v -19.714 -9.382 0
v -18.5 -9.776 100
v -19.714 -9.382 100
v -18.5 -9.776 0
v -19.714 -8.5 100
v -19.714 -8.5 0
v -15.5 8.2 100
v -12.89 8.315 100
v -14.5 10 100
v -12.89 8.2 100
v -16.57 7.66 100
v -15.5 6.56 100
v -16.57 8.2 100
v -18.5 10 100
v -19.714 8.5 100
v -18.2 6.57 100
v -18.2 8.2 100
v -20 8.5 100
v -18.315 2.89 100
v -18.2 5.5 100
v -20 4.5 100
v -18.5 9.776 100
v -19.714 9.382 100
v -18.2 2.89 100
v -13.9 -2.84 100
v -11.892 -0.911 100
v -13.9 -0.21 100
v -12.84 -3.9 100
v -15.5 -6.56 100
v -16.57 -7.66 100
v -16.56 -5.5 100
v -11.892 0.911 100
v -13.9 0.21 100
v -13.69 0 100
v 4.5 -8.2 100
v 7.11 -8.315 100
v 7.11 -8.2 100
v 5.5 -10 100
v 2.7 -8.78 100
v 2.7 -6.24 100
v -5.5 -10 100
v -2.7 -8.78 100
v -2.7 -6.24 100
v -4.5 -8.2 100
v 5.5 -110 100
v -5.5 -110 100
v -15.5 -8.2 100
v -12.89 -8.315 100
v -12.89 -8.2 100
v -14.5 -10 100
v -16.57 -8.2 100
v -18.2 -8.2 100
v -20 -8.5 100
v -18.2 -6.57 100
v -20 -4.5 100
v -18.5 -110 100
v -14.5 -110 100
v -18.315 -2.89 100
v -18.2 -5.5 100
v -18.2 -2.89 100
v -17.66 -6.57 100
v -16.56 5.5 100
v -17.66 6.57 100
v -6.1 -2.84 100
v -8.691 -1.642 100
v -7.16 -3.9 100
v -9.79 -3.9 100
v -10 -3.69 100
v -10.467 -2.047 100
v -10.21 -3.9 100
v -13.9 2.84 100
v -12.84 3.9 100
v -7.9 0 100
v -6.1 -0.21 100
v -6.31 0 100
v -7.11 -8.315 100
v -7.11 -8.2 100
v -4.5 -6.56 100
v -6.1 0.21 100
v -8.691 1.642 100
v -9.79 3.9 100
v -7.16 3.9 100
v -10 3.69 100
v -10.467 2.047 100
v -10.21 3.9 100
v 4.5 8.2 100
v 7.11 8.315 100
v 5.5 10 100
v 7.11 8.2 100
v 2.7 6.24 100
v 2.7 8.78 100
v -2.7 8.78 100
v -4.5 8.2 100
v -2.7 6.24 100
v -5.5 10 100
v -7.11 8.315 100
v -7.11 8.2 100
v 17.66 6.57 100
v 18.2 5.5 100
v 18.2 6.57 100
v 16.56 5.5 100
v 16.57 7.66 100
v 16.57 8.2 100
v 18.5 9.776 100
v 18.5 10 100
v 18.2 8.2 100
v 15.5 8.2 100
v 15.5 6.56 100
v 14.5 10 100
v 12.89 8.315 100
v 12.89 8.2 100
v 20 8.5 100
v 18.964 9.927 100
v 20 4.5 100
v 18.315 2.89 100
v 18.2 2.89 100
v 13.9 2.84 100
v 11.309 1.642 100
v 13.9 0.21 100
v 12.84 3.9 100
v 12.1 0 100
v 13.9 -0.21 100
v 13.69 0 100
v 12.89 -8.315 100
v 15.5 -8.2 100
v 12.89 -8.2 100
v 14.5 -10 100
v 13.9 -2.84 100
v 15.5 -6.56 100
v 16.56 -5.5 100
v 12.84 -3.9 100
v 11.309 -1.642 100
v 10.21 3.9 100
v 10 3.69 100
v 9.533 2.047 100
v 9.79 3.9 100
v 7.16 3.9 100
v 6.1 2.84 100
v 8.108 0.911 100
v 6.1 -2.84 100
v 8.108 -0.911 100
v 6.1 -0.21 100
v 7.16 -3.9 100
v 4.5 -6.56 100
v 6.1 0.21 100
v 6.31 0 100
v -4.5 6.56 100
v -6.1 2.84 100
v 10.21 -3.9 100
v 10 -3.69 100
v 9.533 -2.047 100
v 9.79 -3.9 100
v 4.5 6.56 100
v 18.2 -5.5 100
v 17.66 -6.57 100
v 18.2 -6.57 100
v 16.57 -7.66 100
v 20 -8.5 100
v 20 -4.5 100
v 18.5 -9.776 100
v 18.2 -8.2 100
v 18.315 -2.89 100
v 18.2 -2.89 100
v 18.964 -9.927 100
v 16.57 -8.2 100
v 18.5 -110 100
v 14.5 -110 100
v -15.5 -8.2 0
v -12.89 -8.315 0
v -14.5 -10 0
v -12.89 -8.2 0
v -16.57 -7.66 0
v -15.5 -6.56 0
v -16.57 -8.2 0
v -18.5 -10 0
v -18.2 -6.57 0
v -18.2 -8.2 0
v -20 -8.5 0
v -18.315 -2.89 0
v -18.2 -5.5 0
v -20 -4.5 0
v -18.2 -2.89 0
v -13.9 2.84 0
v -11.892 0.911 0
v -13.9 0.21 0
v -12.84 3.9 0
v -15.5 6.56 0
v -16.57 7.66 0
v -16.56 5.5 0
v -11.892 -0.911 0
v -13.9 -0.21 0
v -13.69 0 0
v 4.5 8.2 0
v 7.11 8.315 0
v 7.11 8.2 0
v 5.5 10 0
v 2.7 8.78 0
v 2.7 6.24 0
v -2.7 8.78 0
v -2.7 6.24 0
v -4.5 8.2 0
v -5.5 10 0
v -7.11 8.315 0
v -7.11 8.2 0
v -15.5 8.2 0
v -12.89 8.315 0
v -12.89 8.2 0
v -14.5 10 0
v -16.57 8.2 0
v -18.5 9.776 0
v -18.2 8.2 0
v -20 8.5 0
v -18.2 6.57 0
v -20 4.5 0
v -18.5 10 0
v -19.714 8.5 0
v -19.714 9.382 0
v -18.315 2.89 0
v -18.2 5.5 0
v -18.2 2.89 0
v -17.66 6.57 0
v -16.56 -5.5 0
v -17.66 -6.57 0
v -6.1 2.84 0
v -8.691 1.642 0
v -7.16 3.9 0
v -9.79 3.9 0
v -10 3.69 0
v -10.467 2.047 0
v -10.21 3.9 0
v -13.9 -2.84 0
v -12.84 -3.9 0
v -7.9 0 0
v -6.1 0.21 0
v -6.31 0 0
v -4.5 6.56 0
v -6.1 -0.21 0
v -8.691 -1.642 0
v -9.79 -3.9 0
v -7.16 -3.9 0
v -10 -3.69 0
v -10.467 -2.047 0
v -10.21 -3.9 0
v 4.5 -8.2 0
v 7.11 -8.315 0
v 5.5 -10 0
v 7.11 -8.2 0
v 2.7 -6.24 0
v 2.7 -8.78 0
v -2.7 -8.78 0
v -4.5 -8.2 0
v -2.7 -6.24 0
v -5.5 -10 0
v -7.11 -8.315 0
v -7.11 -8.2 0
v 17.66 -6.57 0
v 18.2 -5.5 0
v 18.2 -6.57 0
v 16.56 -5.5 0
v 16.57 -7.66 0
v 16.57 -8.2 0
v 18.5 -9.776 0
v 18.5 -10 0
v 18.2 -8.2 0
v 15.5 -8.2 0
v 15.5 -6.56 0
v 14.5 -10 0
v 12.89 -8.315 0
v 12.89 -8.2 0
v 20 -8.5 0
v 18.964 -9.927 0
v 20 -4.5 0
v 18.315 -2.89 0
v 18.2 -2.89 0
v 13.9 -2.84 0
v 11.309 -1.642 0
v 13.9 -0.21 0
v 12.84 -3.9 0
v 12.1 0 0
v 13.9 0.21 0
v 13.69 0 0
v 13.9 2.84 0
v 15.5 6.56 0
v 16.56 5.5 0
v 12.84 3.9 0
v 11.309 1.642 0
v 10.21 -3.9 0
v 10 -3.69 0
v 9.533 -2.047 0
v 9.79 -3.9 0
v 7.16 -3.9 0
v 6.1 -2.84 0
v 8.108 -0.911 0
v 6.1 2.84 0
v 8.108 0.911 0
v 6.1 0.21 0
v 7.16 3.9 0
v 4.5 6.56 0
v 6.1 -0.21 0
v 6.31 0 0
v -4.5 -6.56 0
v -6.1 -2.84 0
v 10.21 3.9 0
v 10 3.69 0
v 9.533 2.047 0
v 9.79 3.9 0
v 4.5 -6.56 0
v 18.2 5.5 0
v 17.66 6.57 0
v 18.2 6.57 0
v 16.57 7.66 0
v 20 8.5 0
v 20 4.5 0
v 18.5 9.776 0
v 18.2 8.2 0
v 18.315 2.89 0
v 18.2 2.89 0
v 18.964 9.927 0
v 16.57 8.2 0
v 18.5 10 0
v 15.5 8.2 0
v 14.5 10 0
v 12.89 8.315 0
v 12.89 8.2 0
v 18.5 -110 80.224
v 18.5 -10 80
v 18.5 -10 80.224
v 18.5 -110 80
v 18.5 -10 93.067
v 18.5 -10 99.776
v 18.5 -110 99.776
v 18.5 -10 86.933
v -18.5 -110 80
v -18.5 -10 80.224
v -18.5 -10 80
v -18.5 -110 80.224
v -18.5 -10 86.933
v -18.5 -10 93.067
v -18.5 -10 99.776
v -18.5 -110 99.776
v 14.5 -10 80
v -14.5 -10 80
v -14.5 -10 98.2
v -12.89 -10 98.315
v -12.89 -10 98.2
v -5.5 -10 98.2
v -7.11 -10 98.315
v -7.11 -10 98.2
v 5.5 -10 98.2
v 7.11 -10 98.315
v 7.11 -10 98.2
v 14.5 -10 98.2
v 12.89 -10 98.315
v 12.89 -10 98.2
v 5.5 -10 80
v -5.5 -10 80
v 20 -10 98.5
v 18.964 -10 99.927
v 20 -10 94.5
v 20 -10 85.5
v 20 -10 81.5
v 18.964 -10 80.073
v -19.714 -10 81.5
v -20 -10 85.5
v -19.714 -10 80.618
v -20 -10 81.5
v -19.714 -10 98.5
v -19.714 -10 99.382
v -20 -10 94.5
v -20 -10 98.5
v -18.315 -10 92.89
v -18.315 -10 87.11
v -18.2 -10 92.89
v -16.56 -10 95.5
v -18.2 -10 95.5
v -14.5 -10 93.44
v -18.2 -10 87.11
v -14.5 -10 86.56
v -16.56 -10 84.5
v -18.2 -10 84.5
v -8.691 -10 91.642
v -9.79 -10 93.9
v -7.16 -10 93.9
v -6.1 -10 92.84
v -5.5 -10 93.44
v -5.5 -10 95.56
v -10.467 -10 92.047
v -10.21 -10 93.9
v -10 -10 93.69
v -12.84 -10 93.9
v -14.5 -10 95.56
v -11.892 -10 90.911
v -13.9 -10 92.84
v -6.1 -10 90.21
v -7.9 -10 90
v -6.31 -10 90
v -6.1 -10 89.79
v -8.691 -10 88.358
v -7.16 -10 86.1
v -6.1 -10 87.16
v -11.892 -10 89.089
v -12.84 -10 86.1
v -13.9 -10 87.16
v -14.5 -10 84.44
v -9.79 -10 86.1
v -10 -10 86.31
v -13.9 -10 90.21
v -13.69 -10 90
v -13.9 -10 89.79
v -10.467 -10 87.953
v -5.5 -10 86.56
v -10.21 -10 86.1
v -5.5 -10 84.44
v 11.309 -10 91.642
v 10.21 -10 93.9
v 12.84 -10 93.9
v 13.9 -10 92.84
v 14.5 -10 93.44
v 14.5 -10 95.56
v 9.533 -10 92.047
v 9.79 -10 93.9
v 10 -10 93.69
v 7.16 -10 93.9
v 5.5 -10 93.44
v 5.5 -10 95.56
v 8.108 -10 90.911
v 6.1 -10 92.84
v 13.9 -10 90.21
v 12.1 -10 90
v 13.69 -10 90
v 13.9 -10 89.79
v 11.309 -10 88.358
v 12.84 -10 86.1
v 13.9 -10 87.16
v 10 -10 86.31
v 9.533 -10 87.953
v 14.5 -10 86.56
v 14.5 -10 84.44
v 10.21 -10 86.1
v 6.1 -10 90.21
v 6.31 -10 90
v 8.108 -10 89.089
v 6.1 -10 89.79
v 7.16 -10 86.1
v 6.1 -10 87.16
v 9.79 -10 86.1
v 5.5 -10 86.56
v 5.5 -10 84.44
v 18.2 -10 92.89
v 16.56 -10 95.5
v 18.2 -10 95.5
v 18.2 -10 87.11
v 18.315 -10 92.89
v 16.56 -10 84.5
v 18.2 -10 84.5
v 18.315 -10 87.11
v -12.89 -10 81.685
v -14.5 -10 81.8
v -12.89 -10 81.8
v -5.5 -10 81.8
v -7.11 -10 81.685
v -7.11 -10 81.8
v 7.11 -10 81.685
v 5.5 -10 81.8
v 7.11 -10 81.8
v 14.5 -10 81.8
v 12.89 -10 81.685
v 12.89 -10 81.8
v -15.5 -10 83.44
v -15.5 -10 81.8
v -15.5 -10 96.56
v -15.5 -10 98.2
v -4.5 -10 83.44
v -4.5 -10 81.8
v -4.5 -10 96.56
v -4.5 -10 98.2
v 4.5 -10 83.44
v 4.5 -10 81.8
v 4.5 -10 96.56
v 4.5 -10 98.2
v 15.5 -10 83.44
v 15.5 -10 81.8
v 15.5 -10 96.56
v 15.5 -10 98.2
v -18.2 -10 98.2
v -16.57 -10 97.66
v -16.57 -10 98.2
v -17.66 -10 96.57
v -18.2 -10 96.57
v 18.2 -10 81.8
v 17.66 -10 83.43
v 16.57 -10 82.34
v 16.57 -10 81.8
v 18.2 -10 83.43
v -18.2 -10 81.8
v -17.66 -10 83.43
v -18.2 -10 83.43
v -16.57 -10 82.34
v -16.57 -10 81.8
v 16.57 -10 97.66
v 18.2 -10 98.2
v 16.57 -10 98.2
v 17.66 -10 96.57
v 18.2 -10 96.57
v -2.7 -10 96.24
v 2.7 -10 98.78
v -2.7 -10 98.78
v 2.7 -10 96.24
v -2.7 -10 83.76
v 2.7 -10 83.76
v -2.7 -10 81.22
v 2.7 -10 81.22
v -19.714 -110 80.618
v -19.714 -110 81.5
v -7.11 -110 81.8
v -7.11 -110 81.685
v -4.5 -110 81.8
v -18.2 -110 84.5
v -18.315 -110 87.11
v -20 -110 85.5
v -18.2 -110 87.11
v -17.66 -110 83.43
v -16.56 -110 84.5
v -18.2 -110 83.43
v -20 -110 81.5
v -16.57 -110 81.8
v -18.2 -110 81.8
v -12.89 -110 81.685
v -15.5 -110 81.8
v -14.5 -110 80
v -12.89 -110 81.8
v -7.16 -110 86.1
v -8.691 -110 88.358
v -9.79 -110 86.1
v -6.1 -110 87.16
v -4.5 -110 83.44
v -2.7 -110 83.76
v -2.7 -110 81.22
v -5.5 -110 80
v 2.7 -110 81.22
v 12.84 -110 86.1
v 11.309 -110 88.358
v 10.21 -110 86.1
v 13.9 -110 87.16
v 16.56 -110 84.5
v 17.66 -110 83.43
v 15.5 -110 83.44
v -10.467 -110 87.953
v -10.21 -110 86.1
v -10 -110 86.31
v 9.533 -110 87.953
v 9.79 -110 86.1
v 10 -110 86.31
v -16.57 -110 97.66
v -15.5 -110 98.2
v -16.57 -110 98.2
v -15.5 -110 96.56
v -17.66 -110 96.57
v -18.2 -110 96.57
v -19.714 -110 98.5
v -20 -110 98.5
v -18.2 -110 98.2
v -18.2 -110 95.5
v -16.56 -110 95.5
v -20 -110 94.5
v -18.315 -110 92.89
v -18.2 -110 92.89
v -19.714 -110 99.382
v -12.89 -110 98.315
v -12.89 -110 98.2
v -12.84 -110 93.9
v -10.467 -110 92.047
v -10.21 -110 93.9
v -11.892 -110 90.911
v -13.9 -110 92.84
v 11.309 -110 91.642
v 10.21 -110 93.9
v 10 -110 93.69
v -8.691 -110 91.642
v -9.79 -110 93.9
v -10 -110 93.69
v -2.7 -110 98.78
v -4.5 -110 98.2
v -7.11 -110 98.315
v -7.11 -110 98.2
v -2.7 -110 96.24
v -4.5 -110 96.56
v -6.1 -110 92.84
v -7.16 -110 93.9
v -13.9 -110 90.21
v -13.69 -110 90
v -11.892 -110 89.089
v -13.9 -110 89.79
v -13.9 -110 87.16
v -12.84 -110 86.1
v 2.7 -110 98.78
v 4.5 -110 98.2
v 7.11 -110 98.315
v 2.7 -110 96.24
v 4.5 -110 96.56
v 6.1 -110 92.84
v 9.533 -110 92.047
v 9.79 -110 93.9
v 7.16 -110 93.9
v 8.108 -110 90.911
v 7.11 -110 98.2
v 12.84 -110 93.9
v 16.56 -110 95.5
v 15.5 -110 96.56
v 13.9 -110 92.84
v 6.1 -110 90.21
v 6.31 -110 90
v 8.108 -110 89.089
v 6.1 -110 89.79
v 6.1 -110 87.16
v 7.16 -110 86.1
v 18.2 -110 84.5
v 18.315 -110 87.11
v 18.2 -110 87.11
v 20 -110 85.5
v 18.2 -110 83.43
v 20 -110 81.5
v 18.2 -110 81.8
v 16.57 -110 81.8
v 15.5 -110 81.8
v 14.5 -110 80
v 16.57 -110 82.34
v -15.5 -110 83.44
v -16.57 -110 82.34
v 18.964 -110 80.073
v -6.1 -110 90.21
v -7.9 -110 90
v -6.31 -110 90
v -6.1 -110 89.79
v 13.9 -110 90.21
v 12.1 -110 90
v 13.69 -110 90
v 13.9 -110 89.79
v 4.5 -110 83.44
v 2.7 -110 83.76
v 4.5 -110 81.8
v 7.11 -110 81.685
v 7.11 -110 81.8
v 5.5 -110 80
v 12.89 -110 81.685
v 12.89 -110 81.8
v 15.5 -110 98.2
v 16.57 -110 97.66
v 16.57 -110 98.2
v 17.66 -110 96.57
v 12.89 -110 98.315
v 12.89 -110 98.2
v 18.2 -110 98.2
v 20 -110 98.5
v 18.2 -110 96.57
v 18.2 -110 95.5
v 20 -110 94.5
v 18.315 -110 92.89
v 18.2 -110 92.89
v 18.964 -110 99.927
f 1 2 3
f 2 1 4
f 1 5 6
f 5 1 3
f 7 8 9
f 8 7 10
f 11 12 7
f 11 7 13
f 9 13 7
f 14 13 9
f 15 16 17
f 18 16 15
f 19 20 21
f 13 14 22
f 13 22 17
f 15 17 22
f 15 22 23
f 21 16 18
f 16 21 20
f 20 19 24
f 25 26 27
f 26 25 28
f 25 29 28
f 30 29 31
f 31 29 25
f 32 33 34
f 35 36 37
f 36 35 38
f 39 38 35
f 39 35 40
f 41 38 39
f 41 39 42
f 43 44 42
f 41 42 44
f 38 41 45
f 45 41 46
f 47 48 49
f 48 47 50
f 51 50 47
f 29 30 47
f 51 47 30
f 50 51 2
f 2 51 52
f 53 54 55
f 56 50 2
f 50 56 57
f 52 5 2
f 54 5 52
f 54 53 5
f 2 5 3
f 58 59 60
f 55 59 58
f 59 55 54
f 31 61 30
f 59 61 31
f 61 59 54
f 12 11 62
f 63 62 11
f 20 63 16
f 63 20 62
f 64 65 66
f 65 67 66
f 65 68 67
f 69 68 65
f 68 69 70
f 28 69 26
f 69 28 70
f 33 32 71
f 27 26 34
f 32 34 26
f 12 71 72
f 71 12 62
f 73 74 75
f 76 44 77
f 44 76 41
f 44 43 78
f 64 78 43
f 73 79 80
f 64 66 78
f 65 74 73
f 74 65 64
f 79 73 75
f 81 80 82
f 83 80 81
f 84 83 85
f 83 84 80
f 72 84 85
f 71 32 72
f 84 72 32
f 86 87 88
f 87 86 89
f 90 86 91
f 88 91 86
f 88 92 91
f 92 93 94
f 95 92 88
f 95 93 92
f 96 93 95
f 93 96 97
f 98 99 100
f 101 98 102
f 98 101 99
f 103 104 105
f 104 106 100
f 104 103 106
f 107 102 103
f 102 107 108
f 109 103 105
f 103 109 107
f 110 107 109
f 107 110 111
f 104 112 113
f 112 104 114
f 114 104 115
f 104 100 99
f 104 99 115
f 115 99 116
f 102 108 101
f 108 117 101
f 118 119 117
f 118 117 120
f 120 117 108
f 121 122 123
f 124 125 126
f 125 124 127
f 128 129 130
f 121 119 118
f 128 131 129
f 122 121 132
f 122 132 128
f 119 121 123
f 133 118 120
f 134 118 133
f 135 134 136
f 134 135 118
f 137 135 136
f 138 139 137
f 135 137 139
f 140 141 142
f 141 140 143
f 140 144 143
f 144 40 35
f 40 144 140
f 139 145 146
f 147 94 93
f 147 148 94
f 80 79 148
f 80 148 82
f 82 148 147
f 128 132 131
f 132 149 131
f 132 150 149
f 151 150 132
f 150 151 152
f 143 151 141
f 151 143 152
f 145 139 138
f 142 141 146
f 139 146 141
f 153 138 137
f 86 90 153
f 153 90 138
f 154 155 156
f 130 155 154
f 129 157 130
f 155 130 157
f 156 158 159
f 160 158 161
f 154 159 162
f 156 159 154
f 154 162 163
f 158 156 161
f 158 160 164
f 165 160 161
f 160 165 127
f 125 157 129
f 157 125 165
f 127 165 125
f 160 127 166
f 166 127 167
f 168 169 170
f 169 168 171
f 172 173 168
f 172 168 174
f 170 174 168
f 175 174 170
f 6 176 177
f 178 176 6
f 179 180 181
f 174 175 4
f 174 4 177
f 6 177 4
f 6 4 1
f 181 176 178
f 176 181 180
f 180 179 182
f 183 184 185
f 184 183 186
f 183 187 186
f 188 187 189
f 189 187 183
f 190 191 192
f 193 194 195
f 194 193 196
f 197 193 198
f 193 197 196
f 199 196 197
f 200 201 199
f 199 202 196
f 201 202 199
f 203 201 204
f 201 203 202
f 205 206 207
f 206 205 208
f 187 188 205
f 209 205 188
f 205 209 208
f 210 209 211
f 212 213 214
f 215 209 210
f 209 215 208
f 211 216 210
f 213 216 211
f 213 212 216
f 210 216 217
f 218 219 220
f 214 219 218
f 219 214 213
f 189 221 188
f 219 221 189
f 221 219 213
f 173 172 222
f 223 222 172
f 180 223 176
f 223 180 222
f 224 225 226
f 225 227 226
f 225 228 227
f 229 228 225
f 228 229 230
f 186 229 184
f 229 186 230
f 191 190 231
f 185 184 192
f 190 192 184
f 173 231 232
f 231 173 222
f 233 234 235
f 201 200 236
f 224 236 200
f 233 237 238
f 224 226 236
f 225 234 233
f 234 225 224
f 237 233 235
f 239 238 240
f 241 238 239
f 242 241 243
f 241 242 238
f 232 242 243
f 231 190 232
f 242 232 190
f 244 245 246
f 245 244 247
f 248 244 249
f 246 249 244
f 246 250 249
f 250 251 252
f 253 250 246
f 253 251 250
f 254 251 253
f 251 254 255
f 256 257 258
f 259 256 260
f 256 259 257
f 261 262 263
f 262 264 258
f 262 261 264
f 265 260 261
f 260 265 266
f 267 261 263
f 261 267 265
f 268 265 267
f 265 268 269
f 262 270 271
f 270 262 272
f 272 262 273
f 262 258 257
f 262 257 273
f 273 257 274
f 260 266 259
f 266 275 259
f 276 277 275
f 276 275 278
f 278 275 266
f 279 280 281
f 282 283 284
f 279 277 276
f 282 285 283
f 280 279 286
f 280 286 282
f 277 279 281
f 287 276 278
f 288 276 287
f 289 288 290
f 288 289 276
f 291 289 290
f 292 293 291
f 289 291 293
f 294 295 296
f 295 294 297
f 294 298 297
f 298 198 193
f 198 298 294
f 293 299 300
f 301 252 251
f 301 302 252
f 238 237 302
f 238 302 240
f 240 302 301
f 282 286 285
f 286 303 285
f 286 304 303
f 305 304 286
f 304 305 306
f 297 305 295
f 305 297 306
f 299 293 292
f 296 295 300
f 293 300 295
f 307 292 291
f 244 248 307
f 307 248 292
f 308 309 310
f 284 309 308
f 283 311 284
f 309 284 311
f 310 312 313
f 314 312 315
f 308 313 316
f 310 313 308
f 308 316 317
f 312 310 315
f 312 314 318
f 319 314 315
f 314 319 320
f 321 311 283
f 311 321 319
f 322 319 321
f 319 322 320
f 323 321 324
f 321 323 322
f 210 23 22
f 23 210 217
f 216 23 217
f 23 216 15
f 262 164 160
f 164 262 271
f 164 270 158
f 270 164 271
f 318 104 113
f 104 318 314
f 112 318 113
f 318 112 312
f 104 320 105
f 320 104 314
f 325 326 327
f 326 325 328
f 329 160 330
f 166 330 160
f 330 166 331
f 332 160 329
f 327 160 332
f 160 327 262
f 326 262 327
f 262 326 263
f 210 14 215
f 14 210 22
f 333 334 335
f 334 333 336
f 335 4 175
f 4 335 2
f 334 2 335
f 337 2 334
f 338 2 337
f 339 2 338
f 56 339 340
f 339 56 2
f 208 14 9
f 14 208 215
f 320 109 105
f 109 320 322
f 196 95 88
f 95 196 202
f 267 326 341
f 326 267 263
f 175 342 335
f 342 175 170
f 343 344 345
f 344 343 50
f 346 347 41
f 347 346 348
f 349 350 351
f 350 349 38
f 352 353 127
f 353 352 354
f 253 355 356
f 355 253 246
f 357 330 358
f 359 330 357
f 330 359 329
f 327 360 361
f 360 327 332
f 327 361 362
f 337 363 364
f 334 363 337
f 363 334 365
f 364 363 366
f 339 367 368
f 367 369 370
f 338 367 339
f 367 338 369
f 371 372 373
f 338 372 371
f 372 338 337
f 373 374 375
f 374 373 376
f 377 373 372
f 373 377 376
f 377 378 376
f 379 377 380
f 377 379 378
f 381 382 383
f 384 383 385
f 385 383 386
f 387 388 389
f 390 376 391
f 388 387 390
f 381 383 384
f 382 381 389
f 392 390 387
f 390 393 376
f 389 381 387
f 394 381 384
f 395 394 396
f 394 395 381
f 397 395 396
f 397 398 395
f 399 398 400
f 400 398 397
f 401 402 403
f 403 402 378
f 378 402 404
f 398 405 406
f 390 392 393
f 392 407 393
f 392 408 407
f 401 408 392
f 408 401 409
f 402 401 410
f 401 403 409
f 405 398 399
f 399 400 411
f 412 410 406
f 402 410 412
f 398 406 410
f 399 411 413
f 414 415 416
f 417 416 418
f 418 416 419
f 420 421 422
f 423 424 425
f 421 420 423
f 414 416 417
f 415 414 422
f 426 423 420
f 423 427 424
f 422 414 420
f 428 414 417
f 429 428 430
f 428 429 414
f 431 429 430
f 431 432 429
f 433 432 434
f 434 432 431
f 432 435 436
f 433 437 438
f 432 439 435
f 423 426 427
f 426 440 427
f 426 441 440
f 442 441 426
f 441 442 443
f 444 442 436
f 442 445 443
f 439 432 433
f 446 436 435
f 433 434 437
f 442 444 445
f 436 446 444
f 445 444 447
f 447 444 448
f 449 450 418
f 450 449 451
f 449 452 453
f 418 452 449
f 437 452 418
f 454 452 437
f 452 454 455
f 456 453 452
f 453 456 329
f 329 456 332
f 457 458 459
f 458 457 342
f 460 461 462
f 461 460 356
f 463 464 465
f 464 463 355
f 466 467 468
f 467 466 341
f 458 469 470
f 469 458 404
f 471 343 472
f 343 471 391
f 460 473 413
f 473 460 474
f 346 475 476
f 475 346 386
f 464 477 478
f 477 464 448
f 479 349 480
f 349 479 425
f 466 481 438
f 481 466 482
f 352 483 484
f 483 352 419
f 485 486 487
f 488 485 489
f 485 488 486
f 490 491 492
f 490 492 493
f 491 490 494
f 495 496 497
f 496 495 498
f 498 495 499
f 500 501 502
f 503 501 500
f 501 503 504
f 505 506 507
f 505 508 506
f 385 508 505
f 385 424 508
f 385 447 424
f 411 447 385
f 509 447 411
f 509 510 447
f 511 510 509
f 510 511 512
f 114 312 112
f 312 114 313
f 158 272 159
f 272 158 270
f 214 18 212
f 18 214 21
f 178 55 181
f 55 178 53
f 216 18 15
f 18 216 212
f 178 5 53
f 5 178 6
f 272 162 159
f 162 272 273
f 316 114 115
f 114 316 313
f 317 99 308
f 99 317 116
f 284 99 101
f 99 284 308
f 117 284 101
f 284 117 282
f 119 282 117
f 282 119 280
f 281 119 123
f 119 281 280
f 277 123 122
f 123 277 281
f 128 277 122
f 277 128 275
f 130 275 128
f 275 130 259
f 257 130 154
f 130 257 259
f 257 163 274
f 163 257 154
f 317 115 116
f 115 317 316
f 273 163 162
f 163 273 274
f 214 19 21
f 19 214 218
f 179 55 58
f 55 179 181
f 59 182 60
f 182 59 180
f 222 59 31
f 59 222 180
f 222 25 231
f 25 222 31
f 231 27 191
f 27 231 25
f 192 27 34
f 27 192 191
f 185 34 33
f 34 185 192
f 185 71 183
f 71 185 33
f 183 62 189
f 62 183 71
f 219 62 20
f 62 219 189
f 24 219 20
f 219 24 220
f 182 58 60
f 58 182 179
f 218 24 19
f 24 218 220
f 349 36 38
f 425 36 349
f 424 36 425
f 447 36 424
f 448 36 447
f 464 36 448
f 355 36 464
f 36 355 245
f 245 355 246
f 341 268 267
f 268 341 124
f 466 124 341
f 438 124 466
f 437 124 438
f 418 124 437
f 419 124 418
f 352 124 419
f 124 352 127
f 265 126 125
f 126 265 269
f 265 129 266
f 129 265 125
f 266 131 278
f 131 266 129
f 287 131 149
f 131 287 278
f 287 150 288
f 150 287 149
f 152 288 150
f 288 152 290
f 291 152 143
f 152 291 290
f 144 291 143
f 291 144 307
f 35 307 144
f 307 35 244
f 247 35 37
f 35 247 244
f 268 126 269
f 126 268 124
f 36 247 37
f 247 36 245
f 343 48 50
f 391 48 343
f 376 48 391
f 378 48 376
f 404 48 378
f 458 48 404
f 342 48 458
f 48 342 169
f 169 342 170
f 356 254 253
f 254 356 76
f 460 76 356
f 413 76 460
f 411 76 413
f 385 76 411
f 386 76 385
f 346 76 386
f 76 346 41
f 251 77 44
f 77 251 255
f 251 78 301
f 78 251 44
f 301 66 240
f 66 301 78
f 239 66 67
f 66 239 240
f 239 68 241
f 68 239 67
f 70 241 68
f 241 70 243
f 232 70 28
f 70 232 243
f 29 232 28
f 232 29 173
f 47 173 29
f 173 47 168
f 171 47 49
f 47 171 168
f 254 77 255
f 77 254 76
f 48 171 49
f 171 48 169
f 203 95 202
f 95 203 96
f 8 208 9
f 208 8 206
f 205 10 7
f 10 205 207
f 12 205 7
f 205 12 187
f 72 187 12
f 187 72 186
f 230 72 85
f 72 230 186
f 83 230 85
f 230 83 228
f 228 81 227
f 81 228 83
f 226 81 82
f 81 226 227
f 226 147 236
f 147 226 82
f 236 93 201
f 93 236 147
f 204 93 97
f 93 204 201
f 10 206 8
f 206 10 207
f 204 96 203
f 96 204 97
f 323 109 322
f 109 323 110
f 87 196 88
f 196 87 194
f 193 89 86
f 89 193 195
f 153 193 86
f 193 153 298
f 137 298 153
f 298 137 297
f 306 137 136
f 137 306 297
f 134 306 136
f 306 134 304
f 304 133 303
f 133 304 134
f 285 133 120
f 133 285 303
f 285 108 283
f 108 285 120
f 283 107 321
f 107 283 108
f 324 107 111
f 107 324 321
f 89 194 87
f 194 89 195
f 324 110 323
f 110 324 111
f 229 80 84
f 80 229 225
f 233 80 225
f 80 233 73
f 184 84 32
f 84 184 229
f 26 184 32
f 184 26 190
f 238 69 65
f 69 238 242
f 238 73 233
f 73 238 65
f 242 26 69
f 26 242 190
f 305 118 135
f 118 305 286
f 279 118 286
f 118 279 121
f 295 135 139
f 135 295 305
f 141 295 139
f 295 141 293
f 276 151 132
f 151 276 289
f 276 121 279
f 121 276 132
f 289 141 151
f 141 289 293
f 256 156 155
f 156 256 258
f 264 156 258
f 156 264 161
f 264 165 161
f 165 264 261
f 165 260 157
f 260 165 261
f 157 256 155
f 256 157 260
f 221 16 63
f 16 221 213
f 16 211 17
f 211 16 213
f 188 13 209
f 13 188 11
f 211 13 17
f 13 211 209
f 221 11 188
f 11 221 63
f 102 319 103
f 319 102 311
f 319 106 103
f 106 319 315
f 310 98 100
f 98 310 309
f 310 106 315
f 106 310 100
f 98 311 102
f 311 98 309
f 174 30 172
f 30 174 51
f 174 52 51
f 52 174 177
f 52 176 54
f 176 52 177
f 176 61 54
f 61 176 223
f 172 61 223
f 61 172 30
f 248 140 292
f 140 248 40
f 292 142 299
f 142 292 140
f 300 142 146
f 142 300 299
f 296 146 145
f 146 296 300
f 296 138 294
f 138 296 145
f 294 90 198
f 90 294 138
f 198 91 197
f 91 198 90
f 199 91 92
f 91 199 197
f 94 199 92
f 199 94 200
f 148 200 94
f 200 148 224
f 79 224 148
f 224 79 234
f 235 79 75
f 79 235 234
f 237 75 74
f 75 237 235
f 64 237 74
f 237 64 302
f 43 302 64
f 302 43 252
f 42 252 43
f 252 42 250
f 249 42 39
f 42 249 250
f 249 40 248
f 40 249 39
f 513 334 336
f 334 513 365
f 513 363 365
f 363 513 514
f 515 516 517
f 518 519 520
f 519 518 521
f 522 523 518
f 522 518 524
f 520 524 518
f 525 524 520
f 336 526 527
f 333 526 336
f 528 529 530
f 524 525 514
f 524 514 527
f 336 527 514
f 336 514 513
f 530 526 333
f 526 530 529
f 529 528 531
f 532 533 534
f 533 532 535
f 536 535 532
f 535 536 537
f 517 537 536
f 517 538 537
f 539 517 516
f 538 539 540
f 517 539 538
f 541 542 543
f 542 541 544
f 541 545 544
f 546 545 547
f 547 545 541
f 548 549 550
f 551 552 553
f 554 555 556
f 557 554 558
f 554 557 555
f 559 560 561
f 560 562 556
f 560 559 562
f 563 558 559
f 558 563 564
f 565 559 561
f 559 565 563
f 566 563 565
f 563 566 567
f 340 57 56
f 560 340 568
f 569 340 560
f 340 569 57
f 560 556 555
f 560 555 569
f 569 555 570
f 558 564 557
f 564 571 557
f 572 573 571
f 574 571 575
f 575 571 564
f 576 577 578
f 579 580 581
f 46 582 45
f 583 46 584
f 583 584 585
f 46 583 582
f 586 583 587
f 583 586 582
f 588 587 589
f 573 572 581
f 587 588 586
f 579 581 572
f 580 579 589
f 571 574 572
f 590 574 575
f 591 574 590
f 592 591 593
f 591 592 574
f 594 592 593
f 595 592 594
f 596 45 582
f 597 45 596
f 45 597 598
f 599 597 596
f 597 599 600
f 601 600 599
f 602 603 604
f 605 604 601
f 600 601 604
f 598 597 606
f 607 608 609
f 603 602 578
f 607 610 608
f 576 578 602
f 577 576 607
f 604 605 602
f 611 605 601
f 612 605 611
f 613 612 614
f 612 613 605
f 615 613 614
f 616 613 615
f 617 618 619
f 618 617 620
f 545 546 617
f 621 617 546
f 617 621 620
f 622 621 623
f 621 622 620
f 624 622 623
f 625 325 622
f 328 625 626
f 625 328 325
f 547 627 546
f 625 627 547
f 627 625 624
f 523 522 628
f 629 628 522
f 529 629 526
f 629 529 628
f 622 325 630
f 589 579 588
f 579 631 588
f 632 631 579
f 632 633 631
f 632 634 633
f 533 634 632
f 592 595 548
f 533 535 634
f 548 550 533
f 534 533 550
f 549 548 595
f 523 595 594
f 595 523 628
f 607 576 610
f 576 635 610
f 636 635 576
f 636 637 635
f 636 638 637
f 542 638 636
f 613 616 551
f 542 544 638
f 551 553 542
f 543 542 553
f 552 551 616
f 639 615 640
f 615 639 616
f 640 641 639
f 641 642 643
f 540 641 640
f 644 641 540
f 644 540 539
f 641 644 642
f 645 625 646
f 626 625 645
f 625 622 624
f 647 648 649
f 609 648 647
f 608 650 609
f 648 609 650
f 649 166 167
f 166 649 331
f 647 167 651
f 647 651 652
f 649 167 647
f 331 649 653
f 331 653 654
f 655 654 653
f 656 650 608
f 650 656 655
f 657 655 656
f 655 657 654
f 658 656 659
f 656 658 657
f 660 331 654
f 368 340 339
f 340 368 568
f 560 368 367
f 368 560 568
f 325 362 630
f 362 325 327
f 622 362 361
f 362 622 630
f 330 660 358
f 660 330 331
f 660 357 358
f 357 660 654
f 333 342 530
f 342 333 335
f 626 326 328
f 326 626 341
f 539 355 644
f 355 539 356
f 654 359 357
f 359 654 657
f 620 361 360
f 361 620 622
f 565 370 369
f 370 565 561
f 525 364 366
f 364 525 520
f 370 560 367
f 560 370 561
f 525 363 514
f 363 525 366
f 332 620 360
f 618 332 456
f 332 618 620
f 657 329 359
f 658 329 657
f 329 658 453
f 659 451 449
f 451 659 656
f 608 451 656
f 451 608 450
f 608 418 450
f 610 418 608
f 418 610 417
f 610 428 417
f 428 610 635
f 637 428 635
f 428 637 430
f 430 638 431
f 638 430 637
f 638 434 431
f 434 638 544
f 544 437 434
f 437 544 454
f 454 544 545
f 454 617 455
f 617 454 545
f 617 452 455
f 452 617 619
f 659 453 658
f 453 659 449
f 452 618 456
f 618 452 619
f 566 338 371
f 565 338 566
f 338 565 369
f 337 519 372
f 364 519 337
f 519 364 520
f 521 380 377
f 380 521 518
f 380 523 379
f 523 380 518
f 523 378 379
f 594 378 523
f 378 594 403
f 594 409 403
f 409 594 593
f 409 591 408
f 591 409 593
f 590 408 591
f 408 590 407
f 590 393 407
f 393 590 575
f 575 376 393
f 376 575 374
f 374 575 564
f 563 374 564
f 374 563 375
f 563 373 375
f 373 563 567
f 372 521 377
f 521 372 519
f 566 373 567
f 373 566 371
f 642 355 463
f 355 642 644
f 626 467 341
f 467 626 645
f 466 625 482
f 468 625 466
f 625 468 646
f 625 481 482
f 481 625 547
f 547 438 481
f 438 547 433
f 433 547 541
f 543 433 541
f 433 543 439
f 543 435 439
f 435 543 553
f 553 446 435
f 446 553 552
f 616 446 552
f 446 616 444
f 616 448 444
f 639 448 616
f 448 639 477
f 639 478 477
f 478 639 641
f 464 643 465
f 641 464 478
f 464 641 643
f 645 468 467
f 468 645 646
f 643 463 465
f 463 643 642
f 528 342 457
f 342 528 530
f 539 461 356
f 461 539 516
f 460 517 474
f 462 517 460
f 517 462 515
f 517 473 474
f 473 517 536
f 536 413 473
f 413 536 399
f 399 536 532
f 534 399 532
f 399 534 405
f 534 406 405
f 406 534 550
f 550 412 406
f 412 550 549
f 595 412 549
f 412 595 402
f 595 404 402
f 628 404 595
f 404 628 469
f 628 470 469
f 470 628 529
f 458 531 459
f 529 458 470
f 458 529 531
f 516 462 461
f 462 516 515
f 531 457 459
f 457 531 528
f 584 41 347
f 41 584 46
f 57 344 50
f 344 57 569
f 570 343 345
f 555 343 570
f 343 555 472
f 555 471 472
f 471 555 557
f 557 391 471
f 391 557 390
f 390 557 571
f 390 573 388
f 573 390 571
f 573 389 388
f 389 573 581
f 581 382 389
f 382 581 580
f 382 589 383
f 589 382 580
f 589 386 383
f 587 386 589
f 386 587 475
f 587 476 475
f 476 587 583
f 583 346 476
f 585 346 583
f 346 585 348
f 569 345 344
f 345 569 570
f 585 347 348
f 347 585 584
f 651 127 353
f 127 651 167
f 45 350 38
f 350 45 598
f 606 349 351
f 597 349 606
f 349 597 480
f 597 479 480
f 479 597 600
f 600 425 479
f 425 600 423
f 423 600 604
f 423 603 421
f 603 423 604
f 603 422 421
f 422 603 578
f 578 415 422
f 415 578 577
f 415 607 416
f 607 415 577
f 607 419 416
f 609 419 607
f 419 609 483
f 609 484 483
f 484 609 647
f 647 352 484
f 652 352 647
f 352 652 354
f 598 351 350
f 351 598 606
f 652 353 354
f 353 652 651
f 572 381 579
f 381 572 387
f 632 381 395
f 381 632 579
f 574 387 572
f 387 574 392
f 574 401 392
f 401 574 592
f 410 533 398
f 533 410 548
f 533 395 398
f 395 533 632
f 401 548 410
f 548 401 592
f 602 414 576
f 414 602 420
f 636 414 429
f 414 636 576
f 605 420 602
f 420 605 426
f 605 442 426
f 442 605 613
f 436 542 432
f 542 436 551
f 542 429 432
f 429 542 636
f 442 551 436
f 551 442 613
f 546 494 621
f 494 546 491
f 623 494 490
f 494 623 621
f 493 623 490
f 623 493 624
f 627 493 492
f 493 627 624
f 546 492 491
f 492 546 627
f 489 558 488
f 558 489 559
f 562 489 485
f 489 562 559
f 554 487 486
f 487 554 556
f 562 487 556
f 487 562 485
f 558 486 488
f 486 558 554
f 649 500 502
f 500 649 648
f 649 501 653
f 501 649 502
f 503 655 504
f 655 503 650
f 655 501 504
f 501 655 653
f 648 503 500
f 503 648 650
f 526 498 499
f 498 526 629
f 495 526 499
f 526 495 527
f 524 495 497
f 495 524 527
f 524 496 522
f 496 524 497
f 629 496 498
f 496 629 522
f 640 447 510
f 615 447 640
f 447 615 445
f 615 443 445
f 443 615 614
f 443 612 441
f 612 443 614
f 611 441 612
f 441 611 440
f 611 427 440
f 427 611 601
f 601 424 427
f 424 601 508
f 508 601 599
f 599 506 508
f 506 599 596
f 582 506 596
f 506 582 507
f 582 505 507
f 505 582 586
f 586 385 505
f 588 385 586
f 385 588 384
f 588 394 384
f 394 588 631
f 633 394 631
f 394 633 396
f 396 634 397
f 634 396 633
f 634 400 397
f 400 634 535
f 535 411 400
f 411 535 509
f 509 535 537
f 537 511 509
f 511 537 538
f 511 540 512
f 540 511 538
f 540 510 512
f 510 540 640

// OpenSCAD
// file: ../machine.scad
/*
 * Helpers for machinging; i.e. kerf alowances
 *
 * Copyright 2013 <b@Zi.iS>
 * License CC BY 3.0
 */

ZCUT = 0;
XOFF = 0;
YOFF = 0;

module drawing() {
	//create blueprint
	if(preview==0) {
		projection(cut=true) translate([
			XOFF,
			YOFF,
			ZCUT
		]) {
            if($children) children([0:$children-1]);
		}
	} else {
        if($children) children([0:$children-1]);
	}
}

module kerf_cube(
	size
) {
	translate([
		kerf/2*(1-preview),
		kerf/2*(1-preview),
		0
	]) {
		cube([
			size[0] - kerf*(1-preview),
			size[1] - kerf*(1-preview),
			size[2]
		]);
	}
}

module kerf_cylinder(
	r,
	h
) {
	cylinder(
		r = r - kerf/2*(1-preview),
		h = h
	);
}

module part(
	id,
	name
) {
	if(PART<1 || PART==id || id<0) {
		if(id>=0) echo(str("PART", id, ":", name));
        if($children) children([0:$children-1]);
	}	
}
// file: ../easing.scad
/*
 * Make allowances to ensure good fit.
 *
 * Copyright 2013 <b@Zi.iS>
 * License CC BY 3.0
 */

function ease(value) = min(value*1.1, value + .2);
// file: ../epslion.scad
/*
 * Slightly offset previews to overcome rounding issues
 *
 * Copyright 2013 <b@Zi.iS>
 * License CC BY 3.0
 */

include <config.scad>;

module e(
	shift = -.1,
	size = 1.1
) {
	if(preview == 1) {
		translate([
			0,
			0,
			shift
		]) {
			scale([
				1,
				1,
				size
			]) {
                if($children) children([0:$children-1]);
			}
		}
	} else {
        if($children) children([0:$children-1]);
	}
}

function space(pitch, i) = -pitch/2 + pitch*i;
// file: ../config.scad
/*
 * Default settings
 *
 * Copyright 2013 <b@Zi.iS>
 * License CC BY 3.0
 */

preview = 1;
$fa = 6;
$fs = 2 - 1.5*(1-preview);
kerf = .3;
PART = 0; //all

// preview colors
color_steel = [.8, .8, .8];
color_wood = [.3, .3, 0];
color_print = [0, .8, 0];
color_plastic = [.7, 1, .7];
color_brass = [181/255, 166/255, 66/255];
color_acrylic = [.9,.9,.9,.5];
// file: ../main.scad
/*
 * A library to make SCAD easier.
 *
 * Copyright 2013 <b@Zi.iS>
 * License CC BY 3.0
 */

include <config.scad>;
use <epslion.scad>;
use <easing.scad>;
include <machine.scad>;
// main file
// from https://github.com/fponticelli/smallbridges

include <../main.scad>;
use <MCAD/shapes.scad>;

vslot(sections=2)
	vslot_r([1,0,0], 2)
		vslot(sections=2);

module vslot(length=100, sections=1, id) {
	size = sections * 20;

	cutext = [
		[12.00,4.50], [10.00,4.50], [8.20,2.78], [8.20,5.50],
		[6.56,5.50], [3.90,2.84], [3.90,0.21], [3.69,0.00],
		[3.90,-0.21], [3.90,-2.84], [6.56,-5.50], [8.20,-5.50],
		[8.20,-2.78], [10.00,-4.50], [12.00,-4.50]
	];
	cutint = [
		[16.10,0.21], [16.10,2.84], [12.70,6.24], [12.70,8.78],
		[7.30,8.78], [7.30,6.24], [3.90,2.84], [3.90,0.21],
		[3.69,0.00], [3.90,-0.21], [3.90,-2.84], [7.30,-6.24],
		[7.30,-8.78], [12.70,-8.78], [12.70,-6.24], [16.10,-2.84],
		[16.10,-0.21], [16.31,0.00]
	];
	cutcorner = [
		[8.20,8.20], [6.57,8.20], [6.57,7.66], [7.66,6.57],
		[8.20,6.57]
	];

	part(id, str(length, "mm of ", sections, " section vslot"))
		color([0.27, 0.27, 0.3])
			difference() {
				translate([0,0,length/2])
					roundedBox(20 * sections, 20, length, 1.5);
	
				//End slots
				e() for(i = [0,180])
					rotate([0,0,-i])
						translate([10 * (sections - 1), 0, -0]) {
							linear_extrude(length+20)
								polygon(cutext);
							translate([5,-2.89,-20])
								cube([10,5.78,length+40]);
						}
	
				//Side slots
				e() for(i = [90,270])
					rotate([0,0,-i])
						for(j = [0:sections-1])
							translate([0, (sections - 1) * 10 - 20 * j, 0]) {
								linear_extrude(length)
									polygon(cutext);
								translate([5,-2.89,-20])
									cube([10,5.78,length+40]);
							}
	
				//Center hole
				e() for(i = [0:sections-1])
						translate([i * 20 - 10 * (sections - 1),0,0])
							cylinder(length+20, 2.1, 2.1);
	
				//Corners
				e() for(i = [90,270]) rotate([0,0,-i])
					translate([0,(sections - 1) * 10,-0])
						linear_extrude(length)
							polygon(cutcorner);
				e() for(i = [ 0,180]) rotate([0,0,-i])
					translate([(sections - 1) * 10,0,0])
						linear_extrude(length)
							polygon(cutcorner);
	
				//Between sections
				e() if(sections > 1)
					for(i = [0:sections-2])
						translate([(sections - 3) * 10 - i * 20, 0, 0])
						linear_extrude(length)
							polygon(cutint);
			}
	translate([0,0,length])
		children();
}

module vslot_r(angle, segments) {
	rotate(angle*90)
		translate([
			10*segments * angle[1],
			-10 * angle[0],
			10 *abs(angle[0]) + 10 * segments * abs(angle[1])
		])
			children();
}

module vslot_rr(angle, segments) {
	rotate(angle*90)
		translate([
			-10*segments * angle[1],
			10 * angle[0],
			-10 *abs(angle[0]) - 10 * segments * abs(angle[1])
		])
			children();
}
